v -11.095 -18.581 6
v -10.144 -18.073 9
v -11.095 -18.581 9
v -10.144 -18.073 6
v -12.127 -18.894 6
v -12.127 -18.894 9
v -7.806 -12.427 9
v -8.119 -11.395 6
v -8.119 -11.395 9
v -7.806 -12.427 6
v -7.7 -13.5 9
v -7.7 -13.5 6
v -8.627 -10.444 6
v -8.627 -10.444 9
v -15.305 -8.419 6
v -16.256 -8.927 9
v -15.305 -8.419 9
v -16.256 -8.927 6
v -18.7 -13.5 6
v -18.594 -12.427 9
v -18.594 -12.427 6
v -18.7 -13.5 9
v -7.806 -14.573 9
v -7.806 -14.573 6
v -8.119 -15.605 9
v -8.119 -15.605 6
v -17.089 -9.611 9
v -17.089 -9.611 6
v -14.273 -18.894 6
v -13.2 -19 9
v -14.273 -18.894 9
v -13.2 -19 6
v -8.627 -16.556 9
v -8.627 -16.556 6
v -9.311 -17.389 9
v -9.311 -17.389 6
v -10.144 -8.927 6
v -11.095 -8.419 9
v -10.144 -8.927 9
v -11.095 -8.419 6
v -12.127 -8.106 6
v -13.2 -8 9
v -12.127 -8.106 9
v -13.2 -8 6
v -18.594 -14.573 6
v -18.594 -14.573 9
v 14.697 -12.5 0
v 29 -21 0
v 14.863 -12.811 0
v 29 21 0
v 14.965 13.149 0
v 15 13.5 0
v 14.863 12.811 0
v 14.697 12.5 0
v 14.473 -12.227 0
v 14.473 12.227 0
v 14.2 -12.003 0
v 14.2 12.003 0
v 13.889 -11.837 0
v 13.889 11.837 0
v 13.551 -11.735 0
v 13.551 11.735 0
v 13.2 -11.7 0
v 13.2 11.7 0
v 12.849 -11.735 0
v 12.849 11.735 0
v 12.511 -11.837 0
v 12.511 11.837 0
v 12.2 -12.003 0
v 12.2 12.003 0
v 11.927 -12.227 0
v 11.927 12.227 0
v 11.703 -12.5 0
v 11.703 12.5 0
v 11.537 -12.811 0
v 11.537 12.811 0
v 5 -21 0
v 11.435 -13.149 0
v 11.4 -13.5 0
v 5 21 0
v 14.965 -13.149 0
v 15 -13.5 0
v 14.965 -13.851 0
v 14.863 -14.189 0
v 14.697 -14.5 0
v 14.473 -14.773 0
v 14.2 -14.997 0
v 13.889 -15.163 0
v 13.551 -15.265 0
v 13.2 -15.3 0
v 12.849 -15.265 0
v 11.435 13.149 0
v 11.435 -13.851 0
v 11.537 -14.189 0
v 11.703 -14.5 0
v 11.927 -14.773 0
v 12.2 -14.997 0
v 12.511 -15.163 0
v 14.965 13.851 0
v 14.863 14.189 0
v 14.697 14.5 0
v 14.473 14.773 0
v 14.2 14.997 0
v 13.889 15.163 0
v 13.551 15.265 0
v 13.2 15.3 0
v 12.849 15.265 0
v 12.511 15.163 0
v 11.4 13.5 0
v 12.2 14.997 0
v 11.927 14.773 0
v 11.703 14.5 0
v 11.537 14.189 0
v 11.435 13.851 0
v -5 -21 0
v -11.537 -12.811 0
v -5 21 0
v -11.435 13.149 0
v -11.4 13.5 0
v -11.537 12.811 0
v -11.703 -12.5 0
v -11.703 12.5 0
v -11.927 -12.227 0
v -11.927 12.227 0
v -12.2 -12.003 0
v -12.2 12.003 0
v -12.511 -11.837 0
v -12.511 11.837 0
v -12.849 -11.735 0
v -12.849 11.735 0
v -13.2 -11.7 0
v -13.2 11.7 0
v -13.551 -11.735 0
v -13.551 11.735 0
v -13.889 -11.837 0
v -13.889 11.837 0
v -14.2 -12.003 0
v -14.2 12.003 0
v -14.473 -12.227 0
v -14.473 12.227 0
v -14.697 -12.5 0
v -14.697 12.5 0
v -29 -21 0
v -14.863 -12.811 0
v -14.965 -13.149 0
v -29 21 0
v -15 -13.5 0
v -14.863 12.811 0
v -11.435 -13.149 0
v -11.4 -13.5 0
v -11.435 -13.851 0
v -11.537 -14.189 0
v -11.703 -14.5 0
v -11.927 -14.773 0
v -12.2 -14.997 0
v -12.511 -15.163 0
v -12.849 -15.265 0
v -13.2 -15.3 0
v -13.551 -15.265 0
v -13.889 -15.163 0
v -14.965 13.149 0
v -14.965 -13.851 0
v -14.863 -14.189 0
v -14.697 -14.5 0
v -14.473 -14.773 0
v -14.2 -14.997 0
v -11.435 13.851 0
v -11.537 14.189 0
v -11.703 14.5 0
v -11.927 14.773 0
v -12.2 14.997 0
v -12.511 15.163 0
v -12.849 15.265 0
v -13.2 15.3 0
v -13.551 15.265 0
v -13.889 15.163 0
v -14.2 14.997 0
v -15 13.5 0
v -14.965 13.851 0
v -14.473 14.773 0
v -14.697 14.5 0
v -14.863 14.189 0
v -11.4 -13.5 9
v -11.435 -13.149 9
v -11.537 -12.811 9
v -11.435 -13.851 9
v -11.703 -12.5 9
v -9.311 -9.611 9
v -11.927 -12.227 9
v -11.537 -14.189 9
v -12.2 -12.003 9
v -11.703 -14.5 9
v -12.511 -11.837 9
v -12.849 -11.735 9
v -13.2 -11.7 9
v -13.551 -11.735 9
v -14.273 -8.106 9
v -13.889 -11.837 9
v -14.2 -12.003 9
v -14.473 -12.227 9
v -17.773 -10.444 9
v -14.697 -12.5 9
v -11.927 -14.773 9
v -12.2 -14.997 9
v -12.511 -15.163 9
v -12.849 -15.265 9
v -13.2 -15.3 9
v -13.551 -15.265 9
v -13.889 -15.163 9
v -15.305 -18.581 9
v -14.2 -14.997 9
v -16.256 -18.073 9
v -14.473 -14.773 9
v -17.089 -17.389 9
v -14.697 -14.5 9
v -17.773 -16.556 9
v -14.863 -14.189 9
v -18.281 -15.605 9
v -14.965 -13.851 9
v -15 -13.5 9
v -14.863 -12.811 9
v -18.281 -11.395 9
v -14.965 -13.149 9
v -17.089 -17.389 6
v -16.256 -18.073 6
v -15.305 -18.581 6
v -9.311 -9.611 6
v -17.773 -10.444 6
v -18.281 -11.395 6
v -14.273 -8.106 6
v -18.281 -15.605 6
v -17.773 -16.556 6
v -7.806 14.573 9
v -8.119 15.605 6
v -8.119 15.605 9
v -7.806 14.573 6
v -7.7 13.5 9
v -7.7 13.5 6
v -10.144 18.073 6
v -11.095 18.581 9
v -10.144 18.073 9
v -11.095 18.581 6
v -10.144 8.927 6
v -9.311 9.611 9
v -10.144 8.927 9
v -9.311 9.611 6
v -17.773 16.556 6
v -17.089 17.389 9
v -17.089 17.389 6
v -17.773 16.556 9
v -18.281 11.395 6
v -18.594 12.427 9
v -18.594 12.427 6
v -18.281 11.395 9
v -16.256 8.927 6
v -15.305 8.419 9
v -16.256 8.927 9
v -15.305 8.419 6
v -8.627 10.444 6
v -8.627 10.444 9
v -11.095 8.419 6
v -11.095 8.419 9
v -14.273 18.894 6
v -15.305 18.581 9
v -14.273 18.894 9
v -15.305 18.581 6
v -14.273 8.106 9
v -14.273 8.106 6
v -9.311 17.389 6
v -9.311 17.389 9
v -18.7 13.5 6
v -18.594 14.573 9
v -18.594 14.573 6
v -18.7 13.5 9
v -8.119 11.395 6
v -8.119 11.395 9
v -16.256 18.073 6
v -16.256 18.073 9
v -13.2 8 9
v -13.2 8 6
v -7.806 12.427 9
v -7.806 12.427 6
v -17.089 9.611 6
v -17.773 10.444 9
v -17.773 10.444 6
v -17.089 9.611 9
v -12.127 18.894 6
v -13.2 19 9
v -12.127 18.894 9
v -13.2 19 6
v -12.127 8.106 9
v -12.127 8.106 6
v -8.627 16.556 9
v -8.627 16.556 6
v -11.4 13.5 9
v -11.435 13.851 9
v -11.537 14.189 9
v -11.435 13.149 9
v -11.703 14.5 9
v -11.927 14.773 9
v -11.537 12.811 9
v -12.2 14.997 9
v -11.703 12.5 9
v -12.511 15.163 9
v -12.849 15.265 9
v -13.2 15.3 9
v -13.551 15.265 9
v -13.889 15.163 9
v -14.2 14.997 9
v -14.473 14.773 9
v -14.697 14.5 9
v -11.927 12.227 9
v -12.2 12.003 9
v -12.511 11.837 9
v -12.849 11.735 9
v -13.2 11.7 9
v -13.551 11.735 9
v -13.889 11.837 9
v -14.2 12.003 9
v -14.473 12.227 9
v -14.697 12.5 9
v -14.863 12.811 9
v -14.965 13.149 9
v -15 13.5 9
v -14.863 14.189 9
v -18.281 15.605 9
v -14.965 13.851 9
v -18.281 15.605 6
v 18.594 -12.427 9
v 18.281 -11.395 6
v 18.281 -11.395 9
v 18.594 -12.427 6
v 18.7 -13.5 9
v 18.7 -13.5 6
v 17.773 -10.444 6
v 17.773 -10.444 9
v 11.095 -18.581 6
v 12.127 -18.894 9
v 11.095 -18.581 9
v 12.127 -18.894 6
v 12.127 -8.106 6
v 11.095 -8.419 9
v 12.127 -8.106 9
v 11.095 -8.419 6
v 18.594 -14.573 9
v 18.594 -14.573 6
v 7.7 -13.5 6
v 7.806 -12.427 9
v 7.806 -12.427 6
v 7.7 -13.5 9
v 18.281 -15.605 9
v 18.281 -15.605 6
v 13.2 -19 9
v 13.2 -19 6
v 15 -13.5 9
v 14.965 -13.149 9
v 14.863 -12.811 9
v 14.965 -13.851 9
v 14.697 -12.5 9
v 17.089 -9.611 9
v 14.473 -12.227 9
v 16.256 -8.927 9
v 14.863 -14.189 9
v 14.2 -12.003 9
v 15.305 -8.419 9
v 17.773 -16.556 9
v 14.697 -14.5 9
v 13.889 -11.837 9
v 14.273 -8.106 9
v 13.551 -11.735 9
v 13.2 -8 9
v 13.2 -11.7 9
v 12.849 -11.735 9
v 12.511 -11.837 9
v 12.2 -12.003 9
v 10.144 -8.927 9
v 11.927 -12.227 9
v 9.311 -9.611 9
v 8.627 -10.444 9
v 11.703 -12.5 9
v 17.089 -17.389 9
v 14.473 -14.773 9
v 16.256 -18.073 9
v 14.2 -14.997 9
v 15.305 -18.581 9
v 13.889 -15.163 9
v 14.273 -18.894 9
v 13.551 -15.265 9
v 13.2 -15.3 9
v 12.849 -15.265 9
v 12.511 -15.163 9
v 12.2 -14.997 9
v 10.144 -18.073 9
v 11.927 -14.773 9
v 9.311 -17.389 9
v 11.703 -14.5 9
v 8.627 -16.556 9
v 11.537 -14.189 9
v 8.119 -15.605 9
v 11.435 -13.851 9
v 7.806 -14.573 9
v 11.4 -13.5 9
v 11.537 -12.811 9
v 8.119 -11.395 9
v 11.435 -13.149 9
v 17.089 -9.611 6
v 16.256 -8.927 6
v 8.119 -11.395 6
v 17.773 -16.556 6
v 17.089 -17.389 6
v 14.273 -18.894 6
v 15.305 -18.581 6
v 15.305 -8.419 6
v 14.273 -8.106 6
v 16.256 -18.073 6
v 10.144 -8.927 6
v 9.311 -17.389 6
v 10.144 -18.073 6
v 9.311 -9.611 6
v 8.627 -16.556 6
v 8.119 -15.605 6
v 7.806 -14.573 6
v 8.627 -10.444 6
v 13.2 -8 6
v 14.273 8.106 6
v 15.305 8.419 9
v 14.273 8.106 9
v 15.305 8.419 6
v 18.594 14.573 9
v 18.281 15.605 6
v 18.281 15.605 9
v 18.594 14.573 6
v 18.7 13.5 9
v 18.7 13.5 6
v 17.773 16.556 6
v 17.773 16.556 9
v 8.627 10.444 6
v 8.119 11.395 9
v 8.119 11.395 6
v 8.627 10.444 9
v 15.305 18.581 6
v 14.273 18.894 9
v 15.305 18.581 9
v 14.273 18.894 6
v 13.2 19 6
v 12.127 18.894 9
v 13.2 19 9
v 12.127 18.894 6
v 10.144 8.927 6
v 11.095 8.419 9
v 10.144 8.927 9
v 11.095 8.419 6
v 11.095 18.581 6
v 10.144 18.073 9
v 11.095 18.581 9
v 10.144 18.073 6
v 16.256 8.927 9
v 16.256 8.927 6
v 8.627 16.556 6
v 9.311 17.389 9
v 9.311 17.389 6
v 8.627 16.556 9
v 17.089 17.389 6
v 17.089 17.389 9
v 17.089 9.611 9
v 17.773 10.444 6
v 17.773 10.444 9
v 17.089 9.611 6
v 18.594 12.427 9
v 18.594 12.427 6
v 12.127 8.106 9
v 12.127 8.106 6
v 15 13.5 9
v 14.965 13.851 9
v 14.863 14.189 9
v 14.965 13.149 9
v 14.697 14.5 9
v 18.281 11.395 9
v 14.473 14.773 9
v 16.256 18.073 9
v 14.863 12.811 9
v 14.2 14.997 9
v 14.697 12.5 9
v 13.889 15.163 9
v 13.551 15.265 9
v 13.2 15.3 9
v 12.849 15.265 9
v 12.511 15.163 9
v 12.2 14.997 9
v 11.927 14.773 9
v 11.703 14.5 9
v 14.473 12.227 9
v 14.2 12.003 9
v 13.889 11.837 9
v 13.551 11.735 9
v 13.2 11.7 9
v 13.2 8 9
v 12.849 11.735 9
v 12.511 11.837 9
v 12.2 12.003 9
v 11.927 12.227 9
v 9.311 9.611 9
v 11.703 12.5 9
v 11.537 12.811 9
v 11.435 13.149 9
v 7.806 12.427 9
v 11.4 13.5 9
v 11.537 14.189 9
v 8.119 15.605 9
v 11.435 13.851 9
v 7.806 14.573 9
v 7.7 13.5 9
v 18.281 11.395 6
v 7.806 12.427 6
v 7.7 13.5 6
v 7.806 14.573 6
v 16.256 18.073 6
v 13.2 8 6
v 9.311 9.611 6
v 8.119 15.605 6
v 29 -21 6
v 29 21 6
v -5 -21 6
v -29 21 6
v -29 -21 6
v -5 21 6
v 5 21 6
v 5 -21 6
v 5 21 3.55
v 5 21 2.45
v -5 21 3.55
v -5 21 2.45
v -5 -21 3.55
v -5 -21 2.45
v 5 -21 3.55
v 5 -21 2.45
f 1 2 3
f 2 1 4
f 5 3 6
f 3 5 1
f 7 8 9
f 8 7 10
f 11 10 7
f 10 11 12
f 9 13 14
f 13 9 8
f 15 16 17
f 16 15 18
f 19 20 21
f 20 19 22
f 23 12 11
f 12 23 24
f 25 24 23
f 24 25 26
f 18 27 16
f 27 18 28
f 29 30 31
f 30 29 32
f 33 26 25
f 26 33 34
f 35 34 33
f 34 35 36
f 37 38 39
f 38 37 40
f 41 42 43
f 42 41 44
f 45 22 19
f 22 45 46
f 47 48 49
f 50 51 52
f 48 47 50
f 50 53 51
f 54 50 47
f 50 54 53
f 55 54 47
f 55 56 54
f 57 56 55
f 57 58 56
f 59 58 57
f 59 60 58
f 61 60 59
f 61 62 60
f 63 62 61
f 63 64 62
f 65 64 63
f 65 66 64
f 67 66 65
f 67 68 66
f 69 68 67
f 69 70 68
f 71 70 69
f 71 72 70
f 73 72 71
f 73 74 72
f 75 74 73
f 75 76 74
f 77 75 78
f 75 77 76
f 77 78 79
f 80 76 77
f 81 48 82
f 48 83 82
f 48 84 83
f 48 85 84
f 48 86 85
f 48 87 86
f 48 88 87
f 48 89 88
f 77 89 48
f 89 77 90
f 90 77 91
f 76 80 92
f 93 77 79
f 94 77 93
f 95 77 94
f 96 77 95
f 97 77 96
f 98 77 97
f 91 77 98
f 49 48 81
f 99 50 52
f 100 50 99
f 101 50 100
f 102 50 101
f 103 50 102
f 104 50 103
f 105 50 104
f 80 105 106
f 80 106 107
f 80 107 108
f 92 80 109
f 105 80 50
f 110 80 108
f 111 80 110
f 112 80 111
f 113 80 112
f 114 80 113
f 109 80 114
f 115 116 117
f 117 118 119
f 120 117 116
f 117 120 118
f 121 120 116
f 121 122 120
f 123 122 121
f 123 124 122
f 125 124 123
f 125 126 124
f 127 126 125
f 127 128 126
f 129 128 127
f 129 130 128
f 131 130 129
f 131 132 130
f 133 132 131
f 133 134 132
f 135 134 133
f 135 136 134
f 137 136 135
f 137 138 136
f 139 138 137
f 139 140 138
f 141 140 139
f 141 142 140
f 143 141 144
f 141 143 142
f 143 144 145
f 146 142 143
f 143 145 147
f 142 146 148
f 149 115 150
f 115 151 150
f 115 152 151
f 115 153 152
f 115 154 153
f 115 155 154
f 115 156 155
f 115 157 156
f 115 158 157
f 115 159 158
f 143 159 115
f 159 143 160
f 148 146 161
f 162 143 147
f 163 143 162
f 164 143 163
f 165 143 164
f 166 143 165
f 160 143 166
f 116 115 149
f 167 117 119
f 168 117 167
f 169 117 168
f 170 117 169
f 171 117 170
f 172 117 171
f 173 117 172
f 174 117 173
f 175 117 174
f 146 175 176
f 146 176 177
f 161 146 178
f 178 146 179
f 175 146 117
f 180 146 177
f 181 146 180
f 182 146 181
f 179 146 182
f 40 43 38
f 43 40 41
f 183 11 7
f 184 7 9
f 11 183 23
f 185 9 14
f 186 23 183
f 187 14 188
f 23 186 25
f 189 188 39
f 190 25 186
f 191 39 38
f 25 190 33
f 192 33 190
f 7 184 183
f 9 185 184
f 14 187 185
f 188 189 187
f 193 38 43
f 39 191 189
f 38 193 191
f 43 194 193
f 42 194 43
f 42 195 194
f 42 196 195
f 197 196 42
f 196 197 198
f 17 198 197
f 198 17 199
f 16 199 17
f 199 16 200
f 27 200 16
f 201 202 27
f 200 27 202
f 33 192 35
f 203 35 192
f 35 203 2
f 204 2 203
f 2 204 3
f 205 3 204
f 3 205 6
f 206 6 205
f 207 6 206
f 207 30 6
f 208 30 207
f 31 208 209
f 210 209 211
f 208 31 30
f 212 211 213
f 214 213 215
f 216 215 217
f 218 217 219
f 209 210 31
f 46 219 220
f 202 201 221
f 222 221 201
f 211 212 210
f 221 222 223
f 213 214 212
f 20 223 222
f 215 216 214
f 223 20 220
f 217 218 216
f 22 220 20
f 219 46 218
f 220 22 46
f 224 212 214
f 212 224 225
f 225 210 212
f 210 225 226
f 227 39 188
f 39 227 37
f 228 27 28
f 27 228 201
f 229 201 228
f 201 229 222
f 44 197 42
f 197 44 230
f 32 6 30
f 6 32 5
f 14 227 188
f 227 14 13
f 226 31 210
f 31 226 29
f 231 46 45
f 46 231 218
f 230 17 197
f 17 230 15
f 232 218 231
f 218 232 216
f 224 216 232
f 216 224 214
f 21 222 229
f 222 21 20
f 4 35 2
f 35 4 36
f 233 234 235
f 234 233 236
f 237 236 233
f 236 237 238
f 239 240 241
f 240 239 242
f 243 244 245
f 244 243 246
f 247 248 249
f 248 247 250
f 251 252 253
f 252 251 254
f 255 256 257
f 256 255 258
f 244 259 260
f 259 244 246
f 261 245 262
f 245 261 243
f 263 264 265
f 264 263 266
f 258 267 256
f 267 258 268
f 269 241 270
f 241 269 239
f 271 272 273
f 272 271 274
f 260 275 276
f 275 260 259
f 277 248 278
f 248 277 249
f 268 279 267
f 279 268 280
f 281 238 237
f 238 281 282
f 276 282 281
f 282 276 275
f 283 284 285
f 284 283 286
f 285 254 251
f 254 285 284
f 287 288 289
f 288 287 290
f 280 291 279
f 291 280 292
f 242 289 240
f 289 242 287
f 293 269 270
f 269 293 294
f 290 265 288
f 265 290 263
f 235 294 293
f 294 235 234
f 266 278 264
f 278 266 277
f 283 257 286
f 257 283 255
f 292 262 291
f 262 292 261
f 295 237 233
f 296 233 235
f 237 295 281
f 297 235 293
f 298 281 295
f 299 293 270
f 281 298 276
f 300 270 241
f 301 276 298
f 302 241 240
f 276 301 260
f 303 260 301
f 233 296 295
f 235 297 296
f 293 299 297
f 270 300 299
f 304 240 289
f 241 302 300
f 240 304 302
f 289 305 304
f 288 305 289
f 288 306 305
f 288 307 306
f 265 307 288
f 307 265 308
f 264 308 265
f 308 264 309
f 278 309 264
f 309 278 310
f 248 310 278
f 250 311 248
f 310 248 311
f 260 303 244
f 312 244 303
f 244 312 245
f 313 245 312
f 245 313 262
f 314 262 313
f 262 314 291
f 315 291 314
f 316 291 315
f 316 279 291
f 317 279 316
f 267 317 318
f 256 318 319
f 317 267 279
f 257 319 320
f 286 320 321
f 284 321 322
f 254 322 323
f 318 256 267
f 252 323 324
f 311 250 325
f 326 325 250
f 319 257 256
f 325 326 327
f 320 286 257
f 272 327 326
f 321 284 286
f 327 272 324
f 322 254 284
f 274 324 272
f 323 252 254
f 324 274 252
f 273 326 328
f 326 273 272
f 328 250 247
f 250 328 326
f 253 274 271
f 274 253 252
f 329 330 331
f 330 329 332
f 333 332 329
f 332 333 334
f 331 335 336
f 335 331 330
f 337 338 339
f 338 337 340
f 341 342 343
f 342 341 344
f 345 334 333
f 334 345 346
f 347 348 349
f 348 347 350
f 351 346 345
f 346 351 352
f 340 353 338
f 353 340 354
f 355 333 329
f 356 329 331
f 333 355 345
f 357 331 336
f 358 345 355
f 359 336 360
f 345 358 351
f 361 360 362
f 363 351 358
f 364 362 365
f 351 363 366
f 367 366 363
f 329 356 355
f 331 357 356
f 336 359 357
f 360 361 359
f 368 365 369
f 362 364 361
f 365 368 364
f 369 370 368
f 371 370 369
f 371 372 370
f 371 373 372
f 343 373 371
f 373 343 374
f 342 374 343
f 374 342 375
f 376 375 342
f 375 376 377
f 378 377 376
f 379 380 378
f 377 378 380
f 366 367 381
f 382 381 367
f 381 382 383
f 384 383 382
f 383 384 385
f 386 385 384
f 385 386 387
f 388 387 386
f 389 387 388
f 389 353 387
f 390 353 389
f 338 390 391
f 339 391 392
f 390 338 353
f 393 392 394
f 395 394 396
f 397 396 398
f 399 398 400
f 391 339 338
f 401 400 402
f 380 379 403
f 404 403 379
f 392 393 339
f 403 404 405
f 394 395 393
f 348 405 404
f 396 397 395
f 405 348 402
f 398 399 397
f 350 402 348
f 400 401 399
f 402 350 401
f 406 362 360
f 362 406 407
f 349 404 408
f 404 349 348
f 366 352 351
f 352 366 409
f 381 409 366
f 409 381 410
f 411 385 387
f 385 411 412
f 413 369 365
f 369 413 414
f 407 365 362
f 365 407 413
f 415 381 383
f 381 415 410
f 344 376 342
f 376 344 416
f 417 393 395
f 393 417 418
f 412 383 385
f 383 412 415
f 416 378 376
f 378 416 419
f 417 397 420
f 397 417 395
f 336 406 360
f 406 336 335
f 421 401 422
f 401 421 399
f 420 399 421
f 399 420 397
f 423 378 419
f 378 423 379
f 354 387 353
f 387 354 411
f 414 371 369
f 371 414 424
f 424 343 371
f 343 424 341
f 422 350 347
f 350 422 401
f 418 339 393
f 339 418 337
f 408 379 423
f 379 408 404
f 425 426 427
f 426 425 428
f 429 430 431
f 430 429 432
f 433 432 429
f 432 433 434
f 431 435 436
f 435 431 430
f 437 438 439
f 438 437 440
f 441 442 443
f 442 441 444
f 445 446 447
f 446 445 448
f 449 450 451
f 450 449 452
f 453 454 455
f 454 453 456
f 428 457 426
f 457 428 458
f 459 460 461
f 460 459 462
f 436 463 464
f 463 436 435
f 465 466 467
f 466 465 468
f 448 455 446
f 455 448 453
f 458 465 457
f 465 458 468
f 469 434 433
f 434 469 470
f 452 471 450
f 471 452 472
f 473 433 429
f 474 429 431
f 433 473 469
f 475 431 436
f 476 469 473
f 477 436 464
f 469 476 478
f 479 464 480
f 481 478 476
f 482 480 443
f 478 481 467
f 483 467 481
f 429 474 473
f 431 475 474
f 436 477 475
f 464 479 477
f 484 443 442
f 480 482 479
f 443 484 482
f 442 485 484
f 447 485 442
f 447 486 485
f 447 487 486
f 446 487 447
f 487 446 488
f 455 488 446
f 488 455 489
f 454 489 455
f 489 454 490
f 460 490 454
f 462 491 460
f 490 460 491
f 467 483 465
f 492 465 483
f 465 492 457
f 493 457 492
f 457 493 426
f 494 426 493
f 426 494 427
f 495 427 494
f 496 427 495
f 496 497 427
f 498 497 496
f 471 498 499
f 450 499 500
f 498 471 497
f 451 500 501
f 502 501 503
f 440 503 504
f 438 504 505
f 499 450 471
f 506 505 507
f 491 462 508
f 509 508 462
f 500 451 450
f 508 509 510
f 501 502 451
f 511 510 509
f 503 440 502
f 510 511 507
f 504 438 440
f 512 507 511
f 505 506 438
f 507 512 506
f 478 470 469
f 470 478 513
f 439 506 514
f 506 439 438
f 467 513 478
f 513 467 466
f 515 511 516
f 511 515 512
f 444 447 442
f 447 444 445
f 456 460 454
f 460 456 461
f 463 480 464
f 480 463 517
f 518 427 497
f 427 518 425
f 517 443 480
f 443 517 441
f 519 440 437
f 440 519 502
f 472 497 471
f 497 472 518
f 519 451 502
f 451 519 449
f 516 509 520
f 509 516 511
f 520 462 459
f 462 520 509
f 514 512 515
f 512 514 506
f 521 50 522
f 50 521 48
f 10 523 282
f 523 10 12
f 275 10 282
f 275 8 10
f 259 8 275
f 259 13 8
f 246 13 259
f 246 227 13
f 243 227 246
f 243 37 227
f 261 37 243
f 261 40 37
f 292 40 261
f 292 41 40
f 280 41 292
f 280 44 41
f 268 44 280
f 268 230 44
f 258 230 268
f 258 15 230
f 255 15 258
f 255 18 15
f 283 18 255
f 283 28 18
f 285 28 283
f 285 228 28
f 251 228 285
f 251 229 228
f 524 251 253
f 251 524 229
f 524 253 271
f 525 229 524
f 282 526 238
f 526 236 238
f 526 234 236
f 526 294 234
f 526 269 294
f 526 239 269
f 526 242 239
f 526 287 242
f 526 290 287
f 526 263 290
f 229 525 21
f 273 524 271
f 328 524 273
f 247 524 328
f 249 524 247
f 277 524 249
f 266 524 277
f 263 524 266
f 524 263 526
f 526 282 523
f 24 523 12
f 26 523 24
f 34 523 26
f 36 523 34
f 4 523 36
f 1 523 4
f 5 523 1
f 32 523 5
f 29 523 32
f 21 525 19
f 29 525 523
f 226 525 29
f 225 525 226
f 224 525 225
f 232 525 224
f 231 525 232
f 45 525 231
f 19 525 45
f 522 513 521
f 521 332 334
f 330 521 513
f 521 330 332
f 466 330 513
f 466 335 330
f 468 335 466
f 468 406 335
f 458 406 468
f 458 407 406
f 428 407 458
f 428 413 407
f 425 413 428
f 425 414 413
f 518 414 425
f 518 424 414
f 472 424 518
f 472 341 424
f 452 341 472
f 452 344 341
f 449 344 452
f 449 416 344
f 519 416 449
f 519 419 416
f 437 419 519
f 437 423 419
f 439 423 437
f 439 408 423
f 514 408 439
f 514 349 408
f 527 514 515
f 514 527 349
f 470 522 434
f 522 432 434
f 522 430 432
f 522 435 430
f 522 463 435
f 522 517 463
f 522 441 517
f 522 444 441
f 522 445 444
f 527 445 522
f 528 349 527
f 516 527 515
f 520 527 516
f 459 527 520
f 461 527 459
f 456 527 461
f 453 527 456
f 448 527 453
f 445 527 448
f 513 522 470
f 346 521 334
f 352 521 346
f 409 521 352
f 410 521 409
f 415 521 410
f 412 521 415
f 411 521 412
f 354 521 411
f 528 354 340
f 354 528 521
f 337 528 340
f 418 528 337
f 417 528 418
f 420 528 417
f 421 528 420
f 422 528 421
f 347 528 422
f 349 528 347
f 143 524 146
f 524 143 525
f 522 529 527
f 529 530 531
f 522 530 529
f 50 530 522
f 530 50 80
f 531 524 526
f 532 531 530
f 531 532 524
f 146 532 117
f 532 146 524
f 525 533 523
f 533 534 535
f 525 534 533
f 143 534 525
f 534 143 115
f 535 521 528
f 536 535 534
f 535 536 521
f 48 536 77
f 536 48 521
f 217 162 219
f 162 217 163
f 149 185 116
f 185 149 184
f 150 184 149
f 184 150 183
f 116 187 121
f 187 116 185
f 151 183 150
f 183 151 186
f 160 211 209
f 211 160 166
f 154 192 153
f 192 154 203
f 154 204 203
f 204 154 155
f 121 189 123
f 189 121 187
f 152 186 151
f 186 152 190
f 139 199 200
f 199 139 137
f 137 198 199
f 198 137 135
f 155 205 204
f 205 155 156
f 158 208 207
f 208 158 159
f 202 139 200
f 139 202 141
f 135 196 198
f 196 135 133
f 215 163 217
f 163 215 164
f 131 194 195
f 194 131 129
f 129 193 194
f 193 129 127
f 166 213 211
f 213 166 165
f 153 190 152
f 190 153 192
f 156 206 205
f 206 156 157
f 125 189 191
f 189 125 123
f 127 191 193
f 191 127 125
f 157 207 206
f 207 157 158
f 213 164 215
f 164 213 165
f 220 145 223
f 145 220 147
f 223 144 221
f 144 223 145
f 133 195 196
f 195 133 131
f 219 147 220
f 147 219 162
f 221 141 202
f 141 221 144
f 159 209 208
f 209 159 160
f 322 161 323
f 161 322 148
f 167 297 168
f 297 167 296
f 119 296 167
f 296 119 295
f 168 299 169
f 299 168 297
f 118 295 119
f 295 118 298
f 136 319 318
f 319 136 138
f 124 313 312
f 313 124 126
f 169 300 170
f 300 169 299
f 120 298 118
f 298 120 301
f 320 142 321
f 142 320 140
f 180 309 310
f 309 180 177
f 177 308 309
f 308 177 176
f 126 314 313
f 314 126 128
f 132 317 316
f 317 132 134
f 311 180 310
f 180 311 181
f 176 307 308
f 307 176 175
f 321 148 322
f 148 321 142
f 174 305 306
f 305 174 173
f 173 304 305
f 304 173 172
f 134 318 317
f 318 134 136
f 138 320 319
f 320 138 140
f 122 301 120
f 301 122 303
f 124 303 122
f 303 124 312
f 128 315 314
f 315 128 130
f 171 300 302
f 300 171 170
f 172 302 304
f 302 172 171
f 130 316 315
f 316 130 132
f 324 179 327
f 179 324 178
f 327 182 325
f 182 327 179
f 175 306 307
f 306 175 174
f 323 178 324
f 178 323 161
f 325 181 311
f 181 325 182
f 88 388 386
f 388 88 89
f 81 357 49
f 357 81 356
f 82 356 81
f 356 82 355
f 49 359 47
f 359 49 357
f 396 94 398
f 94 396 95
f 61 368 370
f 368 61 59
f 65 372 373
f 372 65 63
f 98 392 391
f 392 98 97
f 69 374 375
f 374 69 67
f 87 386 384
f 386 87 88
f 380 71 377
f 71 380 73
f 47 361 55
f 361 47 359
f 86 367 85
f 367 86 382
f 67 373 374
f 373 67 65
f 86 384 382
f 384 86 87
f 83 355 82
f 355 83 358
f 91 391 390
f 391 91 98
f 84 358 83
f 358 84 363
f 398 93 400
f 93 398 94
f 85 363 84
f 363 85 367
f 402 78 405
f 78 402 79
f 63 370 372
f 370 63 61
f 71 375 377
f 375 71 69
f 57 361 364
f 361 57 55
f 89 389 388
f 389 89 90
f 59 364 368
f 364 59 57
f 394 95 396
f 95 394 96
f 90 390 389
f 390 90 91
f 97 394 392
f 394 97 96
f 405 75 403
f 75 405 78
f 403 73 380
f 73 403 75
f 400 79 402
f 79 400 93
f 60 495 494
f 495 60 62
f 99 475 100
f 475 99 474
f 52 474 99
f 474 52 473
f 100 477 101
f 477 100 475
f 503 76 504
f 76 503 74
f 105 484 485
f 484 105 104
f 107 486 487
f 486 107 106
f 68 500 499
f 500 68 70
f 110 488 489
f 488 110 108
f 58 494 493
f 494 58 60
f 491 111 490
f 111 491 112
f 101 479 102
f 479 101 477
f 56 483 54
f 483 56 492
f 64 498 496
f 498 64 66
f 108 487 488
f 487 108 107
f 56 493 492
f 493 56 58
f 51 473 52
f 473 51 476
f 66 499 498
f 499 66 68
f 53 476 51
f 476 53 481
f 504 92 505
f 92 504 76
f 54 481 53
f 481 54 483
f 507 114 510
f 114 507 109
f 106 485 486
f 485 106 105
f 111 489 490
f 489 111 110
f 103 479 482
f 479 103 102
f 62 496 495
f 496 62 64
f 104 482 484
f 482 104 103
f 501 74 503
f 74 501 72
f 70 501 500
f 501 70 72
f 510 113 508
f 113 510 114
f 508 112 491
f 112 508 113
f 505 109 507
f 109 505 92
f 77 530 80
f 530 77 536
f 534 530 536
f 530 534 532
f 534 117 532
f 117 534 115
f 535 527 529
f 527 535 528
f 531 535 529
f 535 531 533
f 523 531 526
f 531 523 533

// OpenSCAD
$fn = 32;

// ----------------------------------------------------------------------
// Living hinge: 58 x 42 mm plates, 1.1 mm flexible web
// ----------------------------------------------------------------------

// --- parameters (mm) ---
plate_len = 24;           // plate length outside the web
plate_w = 42;             // plate width
thick = 6;                // plate thickness
web_half = 5;             // half width of the flex band
web_t = 1.1;              // flexible web thickness
web_z = 2.45;             // web position inside the thickness
boss_d = 11;              // screw boss diameter
boss_h = 9;               // screw boss height
boss_x = 13.2;            // screw boss distance from the web
screw_d = 3.6;            // screw hole

difference() {
  union() {
    /* one flat strip, later thinned at the middle */
    translate([-29, -21, 0]) cube([58, 42, 6]);
    /* screw bosses, sunk 0.5 mm into the plates */
    for (sx = [-13.2, 13.2]) {
      for (sy = [-13.5, 13.5]) {
        translate([sx, sy, 0]) cylinder(h = boss_h, d = boss_d);
      }
    }
  }
  /* channel from below: leaves the web on top of it */
  translate([-5, -23.5, -2.5]) cube([10, 47, 4.95]);
  /* channel from above: thins the web down to web_t */
  translate([-5, -23.5, 3.55]) cube([10, 47, 4.95]);
  /* screw holes through the bosses */
  for (sx = [-13.2, 13.2]) {
    for (sy = [-13.5, 13.5]) {
      translate([sx, sy, -2.5]) cylinder(h = boss_h + 5, d = screw_d);
    }
  }
}
